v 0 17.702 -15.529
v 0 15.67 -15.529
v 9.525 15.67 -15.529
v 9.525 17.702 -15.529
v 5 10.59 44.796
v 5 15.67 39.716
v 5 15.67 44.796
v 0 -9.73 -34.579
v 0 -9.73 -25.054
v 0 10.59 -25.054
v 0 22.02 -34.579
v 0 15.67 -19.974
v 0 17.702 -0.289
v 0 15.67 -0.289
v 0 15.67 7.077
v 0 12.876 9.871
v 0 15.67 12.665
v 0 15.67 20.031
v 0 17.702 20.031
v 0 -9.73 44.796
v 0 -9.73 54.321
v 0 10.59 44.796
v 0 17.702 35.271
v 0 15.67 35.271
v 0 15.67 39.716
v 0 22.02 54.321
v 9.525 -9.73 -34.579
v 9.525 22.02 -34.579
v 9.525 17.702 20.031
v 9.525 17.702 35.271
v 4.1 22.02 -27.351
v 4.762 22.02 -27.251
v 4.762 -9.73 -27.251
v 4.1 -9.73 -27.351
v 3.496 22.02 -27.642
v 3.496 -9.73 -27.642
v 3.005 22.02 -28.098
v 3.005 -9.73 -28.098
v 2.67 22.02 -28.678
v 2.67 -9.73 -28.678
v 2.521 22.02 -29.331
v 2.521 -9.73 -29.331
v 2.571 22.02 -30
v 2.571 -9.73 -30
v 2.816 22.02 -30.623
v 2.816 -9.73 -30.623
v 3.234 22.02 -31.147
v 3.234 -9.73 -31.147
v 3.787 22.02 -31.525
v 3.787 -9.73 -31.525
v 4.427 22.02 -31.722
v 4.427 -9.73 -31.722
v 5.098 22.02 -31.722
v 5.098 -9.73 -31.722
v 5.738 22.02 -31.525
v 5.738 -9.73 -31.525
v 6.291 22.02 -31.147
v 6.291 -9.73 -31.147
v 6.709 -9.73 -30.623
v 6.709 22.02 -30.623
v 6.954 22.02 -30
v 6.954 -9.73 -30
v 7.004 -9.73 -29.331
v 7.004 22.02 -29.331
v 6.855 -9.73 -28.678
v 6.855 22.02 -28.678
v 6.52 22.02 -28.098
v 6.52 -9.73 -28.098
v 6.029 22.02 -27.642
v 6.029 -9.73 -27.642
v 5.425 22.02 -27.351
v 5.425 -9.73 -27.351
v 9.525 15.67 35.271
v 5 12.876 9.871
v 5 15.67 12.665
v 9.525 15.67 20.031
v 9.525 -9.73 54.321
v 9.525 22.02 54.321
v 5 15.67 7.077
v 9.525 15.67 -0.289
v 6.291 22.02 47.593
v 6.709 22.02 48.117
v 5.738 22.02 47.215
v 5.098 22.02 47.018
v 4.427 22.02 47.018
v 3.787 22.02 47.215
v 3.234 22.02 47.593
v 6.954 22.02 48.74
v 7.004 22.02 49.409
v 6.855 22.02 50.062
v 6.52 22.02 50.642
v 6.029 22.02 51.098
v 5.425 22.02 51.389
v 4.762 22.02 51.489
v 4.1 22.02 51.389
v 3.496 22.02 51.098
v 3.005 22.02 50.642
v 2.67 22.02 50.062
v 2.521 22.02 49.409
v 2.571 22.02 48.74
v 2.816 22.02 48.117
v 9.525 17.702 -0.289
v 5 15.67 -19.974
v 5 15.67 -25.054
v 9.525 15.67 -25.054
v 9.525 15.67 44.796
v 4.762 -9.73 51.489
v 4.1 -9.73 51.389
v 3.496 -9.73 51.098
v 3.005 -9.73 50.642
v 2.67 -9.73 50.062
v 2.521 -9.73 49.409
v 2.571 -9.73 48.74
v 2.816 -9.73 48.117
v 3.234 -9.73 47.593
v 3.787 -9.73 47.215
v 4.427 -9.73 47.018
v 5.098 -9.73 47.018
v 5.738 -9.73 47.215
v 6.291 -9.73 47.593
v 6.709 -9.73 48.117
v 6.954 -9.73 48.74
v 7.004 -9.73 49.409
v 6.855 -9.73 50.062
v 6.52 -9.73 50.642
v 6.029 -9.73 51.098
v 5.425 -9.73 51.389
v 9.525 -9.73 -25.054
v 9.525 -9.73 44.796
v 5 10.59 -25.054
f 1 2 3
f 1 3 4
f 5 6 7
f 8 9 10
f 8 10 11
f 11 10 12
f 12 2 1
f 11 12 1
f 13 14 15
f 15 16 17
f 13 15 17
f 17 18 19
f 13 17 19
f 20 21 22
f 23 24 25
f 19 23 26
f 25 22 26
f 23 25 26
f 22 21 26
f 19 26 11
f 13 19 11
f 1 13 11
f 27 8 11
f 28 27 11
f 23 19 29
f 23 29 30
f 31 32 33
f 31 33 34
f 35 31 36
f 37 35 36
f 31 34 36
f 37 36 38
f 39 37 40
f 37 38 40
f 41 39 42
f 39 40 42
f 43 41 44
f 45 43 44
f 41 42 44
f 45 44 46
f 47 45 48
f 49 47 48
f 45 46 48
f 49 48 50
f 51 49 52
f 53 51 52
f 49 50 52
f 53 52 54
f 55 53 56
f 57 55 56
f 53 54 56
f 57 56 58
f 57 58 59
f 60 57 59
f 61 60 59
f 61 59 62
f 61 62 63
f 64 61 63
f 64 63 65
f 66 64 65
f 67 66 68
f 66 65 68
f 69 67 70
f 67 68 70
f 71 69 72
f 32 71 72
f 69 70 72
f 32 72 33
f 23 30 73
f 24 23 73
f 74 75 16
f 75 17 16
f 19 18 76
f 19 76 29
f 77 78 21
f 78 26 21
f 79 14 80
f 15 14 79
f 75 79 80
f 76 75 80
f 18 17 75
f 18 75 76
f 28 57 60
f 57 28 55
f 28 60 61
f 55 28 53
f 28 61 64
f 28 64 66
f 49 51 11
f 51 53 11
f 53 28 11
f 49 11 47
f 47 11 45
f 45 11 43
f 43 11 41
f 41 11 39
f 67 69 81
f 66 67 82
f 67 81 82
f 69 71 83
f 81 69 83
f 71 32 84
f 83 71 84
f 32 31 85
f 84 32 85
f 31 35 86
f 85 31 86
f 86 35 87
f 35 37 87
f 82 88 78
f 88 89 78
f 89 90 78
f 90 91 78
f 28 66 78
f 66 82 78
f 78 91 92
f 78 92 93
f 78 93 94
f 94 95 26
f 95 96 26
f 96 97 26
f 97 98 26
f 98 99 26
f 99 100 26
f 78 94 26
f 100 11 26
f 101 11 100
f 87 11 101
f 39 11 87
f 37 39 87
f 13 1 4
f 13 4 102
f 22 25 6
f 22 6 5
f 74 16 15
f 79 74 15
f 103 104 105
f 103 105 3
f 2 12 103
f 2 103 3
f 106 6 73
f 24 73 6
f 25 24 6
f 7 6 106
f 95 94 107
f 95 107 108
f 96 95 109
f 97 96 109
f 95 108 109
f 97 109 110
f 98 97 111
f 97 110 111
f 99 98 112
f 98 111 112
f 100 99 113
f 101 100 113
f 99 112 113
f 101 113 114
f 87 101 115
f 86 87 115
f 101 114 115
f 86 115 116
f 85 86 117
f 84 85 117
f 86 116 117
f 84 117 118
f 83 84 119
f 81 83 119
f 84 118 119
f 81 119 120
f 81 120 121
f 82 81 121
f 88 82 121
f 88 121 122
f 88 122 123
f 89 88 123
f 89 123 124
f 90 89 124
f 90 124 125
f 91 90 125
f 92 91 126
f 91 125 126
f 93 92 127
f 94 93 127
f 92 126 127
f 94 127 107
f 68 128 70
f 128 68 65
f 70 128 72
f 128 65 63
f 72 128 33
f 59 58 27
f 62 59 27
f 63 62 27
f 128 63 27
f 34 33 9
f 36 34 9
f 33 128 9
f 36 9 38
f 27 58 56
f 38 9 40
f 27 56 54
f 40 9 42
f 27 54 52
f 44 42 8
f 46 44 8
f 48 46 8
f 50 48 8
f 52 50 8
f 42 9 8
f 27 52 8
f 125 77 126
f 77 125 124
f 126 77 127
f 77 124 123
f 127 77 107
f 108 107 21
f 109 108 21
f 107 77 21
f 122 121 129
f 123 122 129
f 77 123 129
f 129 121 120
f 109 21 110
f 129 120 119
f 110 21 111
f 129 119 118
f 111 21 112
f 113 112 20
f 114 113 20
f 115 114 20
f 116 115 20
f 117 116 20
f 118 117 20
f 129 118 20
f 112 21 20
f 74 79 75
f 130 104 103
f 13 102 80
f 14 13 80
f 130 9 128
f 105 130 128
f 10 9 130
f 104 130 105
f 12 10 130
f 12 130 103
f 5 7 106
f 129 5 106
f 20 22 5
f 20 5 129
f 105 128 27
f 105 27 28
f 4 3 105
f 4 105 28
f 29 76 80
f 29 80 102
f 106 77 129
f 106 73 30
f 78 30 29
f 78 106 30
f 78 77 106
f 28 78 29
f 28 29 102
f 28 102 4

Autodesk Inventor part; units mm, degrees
ref_plane "YZ Plane" through (0, 0, 0) normal (1, 0, 0) x (0, 1, 0)
ref_plane "XZ Plane" through (0, 0, 0) normal (0, 1, 0) x (-1, 0, 0)
ref_plane "XY Plane" through (0, 0, 0) normal (0, 0, 1) x (1, 0, 0)
sketch "Sketch1" plane through (0, 0, 0) normal (1, 0, 0) x (0, 1, 0)
  line L0 (22.0204, 54.3207) -> (-9.7296, 54.3207)
  line L1 (-9.7296, -34.5793) -> (22.0204, -34.5793)
  line L2 (22.0204, -34.5793) -> (22.0204, 54.3207)
  line L3 (15.6704, 44.7957) -> (-9.7296, 44.7957)
  line L4 (-9.7296, -25.0543) -> (15.6704, -25.0543)
  line L5 (15.6704, -25.0543) -> (15.6704, 44.7957)
  line L6 (-9.7296, 54.3207) -> (-9.7296, 44.7957)
  line L7 (-9.7296, -25.0543) -> (-9.7296, -34.5793)
  dimension "d0" = 88.9
  dimension "d2" = 6.35
  dimension "d3" = 9.525
  dimension "d4" = 9.525
  dimension "d7" = 25.4
  dimension "d8" = 0
extrude "Extrusion1" add sketch "Sketch1" along normal blind 9.525
sketch "Sketch2" plane through (0, 22.0204, 54.3207) normal (0, 1, 0) x (1, 0, 0)
  line L0 (0, 88.9) -> (9.525, 88.9) projected
  line L1 (0, 0) -> (9.525, 0) projected
  line L2 (0, 88.9) -> (0, 0) projected
  point P0 (0, 54.3207)
  point P1 (4.7625, 5.08)
  point P2 (4.7625, 83.82)
  dimension "d9" = 5.08
  dimension "d10" = 5.08
  dimension "d11" = 4.7625
  dimension "d12" = 0
hole "Hole1" at (4.7625, 22.0204, 49.2407) at (4.7625, 22.0204, -29.4993) direction (0, -1, 0) diameter 4.4958 end through all clearance for "Flat Head Machine Screw (82)" size "#8" standard "Ansi Unified Screw Threads"
sketch "Sketch4" plane through (0, 0, 0) normal (-1, 0, 0) x (0, 0, 1)
  line L0 (44.7957, 15.6704) -> (-25.0543, 15.6704) projected
  line L1 (44.7957, -9.7296) -> (44.7957, 15.6704) projected
  line L2 (-25.0543, 15.6704) -> (-25.0543, -9.7296) projected
  line L3 (-25.0543, 10.5904) -> (-19.9743, 15.6704)
  line L4 (-19.9743, 15.6704) -> (-25.0543, 15.6704)
  line L5 (-25.0543, 15.6704) -> (-25.0543, 10.5904)
  line L6 (44.7957, 10.5904) -> (44.7957, 15.6704)
  line L7 (44.7957, 15.6704) -> (39.7157, 15.6704)
  line L8 (39.7157, 15.6704) -> (44.7957, 10.5904)
  point P0 (0, 0)
  dimension "d20" = 45
  dimension "d21" = 5.08
  dimension "d22" = 0
  dimension "d23" = 0
  dimension "d24" = 45
  dimension "d25" = 5.08
  dimension "d26" = 0
  dimension "d27" = 0
extrude "Extrusion2" add sketch "Sketch4" against normal blind 5
sketch "Sketch5" plane through (0, 0, 0) normal (-1, 0, 0) x (0, 0, 1)
  line L0 (7.0767, 15.6704) -> (12.6647, 15.6704)
  line L1 (12.6647, 15.6704) -> (9.8707, 12.8764)
  line L2 (9.8707, 12.8764) -> (7.0767, 15.6704)
  line L3 (39.7157, 15.6704) -> (-19.9743, 15.6704) projected
  line L4 (-34.5793, -9.7296) -> (-34.5793, 22.0204) projected
  point P0 (0, 0)
  dimension "d30" = 90
  dimension "d31" = 45
  dimension "d32" = 2.794
  dimension "d33" = 0
  dimension "d34" = 44.45
extrude "Extrusion3" add sketch "Sketch5" against normal blind 5
sketch "Sketch6" plane through (0, 0, 0) normal (-1, 0, 0) x (0, 0, 1)
  line L0 (-0.2893, 9.5064) -> (-15.5293, 9.5064)
  line L1 (-15.5293, 9.5064) -> (-15.5293, 17.7024)
  line L2 (-15.5293, 17.7024) -> (-0.2893, 17.7024)
  line L3 (-0.2893, 17.7024) -> (-0.2893, 9.5064)
  line L4 (35.2707, 11.3259) -> (20.0307, 11.3259)
  line L5 (20.0307, 11.3259) -> (20.0307, 17.7024)
  line L6 (20.0307, 17.7024) -> (35.2707, 17.7024)
  line L7 (35.2707, 17.7024) -> (35.2707, 11.3259)
  line L8 (39.7157, 15.6704) -> (12.6647, 15.6704) projected
  line L9 (-34.5793, -9.7296) -> (-34.5793, 22.0204) projected
  line L10 (54.3207, 22.0204) -> (54.3207, -9.7296) projected
  point P0 (0, 0)
  dimension "d37" = 2.032
  dimension "d38" = 0
  dimension "d39" = 19.05
  dimension "d40" = 19.05
  dimension "d42" = 15.24
  dimension "d43" = 15.24
extrude "Extrusion4" cut sketch "Sketch6" against normal blind 254
properties part number "SparkMaxTop"
